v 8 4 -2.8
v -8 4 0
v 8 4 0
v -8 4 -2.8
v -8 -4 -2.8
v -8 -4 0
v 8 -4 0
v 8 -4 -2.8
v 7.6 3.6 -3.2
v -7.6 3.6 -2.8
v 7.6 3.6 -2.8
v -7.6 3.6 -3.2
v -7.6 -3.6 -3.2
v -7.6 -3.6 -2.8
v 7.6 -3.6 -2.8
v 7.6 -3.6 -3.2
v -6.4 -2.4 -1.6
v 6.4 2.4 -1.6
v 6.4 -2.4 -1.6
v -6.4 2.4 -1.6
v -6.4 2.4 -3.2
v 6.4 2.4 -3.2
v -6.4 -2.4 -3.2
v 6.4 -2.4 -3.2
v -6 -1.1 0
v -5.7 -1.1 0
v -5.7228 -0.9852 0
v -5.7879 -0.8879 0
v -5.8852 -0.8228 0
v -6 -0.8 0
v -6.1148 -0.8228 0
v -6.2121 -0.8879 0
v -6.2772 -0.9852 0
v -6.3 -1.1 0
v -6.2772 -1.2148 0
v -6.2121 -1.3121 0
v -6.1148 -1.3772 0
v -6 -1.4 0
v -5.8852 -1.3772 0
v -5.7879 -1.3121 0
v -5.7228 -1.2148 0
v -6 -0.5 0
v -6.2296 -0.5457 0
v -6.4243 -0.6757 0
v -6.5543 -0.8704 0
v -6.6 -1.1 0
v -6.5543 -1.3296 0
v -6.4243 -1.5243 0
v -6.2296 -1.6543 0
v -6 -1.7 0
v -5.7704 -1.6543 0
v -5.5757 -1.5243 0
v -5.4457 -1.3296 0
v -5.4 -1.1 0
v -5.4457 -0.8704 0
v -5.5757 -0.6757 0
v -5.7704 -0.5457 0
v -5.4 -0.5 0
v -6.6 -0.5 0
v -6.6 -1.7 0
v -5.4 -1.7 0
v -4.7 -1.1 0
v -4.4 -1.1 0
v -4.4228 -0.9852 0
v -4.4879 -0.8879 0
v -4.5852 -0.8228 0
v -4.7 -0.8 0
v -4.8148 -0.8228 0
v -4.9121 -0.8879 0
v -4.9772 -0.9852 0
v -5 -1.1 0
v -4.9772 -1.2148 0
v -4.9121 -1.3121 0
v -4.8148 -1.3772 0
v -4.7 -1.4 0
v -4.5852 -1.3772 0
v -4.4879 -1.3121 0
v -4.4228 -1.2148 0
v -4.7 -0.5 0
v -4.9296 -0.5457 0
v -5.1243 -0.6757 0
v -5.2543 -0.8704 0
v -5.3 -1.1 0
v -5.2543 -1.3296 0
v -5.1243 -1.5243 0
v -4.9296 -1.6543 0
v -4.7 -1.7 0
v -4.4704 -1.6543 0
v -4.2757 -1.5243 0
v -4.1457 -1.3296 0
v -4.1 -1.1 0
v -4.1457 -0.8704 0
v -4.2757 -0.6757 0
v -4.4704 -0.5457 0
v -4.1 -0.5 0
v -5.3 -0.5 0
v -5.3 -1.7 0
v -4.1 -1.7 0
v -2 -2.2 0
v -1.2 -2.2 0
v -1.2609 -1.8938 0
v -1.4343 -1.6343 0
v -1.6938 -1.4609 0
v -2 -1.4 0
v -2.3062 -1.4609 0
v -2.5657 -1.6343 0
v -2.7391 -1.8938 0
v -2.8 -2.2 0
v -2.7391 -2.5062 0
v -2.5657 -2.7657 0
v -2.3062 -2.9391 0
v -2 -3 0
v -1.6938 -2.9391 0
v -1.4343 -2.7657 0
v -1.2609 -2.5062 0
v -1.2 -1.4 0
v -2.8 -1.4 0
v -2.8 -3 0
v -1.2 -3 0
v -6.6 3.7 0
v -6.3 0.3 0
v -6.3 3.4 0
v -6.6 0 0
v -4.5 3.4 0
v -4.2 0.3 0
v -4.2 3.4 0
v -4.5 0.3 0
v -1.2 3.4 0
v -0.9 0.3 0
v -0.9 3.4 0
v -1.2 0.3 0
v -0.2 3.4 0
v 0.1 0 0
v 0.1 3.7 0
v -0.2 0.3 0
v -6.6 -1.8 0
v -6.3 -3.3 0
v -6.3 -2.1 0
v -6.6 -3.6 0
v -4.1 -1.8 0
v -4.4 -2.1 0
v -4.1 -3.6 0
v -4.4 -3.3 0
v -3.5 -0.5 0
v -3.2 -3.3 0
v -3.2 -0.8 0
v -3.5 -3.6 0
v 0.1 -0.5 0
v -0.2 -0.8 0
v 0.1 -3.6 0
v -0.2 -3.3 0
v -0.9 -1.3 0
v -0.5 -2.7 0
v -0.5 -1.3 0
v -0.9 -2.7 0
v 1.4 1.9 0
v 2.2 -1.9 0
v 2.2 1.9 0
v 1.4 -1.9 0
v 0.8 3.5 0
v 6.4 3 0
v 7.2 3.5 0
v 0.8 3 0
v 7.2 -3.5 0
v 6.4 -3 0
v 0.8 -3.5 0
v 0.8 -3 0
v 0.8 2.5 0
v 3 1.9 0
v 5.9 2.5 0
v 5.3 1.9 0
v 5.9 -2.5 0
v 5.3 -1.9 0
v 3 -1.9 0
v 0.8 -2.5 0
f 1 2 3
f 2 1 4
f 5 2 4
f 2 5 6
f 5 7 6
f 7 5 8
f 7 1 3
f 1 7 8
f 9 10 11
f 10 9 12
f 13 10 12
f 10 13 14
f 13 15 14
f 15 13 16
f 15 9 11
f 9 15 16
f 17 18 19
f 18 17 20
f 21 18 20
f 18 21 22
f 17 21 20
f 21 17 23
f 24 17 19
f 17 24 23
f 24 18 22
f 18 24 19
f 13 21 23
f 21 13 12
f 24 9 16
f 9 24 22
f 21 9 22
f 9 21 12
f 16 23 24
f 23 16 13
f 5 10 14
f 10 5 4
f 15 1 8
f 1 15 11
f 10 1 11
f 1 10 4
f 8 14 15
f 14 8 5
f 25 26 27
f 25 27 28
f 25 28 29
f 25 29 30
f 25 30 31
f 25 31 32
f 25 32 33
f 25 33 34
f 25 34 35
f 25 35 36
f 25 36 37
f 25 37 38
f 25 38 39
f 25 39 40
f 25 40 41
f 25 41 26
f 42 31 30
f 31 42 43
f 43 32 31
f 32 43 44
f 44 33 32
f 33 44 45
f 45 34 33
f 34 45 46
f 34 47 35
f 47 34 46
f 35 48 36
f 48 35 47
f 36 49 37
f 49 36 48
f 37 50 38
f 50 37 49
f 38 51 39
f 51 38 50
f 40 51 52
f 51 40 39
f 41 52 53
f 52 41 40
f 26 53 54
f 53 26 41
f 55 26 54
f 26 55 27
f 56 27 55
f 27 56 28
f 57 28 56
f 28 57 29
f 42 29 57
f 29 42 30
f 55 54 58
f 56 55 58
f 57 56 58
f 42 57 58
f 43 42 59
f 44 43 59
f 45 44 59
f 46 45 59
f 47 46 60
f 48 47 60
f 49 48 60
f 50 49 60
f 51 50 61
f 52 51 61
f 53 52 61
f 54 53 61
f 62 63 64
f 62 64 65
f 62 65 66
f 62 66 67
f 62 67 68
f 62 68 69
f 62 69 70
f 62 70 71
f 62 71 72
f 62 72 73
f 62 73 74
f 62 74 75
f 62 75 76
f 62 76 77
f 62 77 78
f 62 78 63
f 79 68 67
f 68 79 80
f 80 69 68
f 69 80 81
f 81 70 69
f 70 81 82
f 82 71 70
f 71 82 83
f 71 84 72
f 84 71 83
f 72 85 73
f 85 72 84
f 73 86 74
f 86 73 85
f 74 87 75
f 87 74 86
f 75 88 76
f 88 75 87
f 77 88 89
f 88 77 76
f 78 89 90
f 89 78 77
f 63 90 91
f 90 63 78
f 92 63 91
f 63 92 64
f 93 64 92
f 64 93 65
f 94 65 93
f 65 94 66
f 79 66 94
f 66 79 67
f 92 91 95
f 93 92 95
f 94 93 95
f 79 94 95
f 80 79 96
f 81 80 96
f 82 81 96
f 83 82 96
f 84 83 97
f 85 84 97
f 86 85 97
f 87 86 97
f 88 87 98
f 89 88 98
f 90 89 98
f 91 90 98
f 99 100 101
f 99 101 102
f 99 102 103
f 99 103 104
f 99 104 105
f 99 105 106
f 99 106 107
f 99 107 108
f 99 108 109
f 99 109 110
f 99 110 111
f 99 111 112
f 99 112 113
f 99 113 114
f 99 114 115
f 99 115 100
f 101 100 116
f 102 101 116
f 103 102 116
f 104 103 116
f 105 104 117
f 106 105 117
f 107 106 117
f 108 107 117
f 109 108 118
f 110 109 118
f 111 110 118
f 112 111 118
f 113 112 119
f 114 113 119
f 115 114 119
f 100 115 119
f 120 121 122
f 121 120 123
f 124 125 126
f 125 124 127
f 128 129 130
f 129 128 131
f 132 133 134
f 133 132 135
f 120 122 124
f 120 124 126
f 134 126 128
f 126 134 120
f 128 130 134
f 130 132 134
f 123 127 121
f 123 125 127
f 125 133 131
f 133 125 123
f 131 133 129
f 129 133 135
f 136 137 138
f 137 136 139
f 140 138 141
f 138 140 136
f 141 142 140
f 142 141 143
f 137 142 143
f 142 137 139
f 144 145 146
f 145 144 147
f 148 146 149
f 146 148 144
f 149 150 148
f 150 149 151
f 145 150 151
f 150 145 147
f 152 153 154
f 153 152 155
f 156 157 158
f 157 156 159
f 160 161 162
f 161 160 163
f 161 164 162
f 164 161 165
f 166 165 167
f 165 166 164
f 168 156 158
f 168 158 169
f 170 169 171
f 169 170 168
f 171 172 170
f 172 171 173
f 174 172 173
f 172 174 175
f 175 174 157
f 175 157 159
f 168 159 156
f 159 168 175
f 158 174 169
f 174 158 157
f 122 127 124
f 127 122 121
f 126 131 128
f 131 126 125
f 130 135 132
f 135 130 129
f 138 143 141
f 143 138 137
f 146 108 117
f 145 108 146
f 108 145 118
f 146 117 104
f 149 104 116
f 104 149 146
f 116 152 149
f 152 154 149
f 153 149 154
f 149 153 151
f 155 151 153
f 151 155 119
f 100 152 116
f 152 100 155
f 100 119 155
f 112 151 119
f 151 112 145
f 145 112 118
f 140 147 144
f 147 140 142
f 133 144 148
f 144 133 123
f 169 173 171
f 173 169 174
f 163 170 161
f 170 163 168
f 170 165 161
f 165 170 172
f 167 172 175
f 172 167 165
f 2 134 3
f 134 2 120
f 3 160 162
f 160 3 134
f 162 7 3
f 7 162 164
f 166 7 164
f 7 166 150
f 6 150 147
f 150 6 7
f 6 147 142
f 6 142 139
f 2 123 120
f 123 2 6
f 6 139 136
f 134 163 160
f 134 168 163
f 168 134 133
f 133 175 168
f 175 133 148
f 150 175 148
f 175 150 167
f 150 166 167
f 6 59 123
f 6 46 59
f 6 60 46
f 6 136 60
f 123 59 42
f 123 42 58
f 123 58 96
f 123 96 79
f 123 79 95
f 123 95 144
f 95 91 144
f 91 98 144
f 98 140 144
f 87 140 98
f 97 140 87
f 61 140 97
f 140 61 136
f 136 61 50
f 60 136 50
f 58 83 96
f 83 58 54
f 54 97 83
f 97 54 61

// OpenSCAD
// file: ../p/box5.scad
use <../lib.scad>
function ldraw_lib__box5() = [
// 0 Box with 5 Faces and All Edges
// 0 Name: box5.dat
// 0 Author: James Jessiman
// 0 !LDRAW_ORG Primitive UPDATE 2012-01
// 0 !LICENSE Licensed under CC BY 4.0 : see CAreadme.txt
// 
// 0 BFC CERTIFY CCW
  [0,"BFC","CERTIFY"],
  [0,"BFC","CCW"],
// 
// 0 !HISTORY 2002-04-03 [sbliss] Modified for BFC compliance
// 0 !HISTORY 2002-04-25 [PTadmin] Official Update 2002-02
// 0 !HISTORY 2007-06-24 [PTadmin] Header formatted for Contributor Agreement
// 0 !HISTORY 2008-07-01 [PTadmin] Official Update 2008-01
// 0 !HISTORY 2012-02-16 [Philo] Changed to CCW
// 0 !HISTORY 2012-03-30 [PTadmin] Official Update 2012-01
// 
// 
// 2 24 1 1 1 -1 1 1
  [2,24,1,1,1,-1,1,1],
// 2 24 -1 1 1 -1 1 -1
  [2,24,-1,1,1,-1,1,-1],
// 2 24 -1 1 -1 1 1 -1
  [2,24,-1,1,-1,1,1,-1],
// 2 24 1 1 -1 1 1 1
  [2,24,1,1,-1,1,1,1],
// 2 24 1 0 1 -1 0 1
  [2,24,1,0,1,-1,0,1],
// 2 24 -1 0 1 -1 0 -1
  [2,24,-1,0,1,-1,0,-1],
// 2 24 -1 0 -1 1 0 -1
  [2,24,-1,0,-1,1,0,-1],
// 2 24 1 0 -1 1 0 1
  [2,24,1,0,-1,1,0,1],
// 2 24 1 0 1 1 1 1
  [2,24,1,0,1,1,1,1],
// 2 24 -1 0 1 -1 1 1
  [2,24,-1,0,1,-1,1,1],
// 2 24 1 0 -1 1 1 -1
  [2,24,1,0,-1,1,1,-1],
// 2 24 -1 0 -1 -1 1 -1
  [2,24,-1,0,-1,-1,1,-1],
// 4 16 -1 1 1 1 1 1 1 1 -1 -1 1 -1
  [4,16,-1,1,1,1,1,1,1,1,-1,-1,1,-1],
// 4 16 -1 1 1 -1 0 1 1 0 1 1 1 1
  [4,16,-1,1,1,-1,0,1,1,0,1,1,1,1],
// 4 16 -1 1 -1 -1 0 -1 -1 0 1 -1 1 1
  [4,16,-1,1,-1,-1,0,-1,-1,0,1,-1,1,1],
// 4 16 1 1 -1 1 0 -1 -1 0 -1 -1 1 -1
  [4,16,1,1,-1,1,0,-1,-1,0,-1,-1,1,-1],
// 4 16 1 1 1 1 0 1 1 0 -1 1 1 -1
  [4,16,1,1,1,1,0,1,1,0,-1,1,1,-1],
];
module ldraw_lib__box5(step=0, col=false, unit=2/5, alt=false, line=0.2, solid=!$preview)
    makepoly(ldraw_lib__box5(), step=step, col=col, unit=unit, alt=alt, line=line, solid=solid);
ldraw_lib__box5(line=0.2);
// file: ../p/box4.scad
use <../lib.scad>
function ldraw_lib__box4() = [
// 0 Box with 4 Faces (2 Parallel Pairs) and All Edges
// 0 Name: box4.dat
// 0 Author: James Jessiman
// 0 !LDRAW_ORG Primitive UPDATE 2012-01
// 0 !LICENSE Licensed under CC BY 4.0 : see CAreadme.txt
// 
// 0 BFC CERTIFY CCW
  [0,"BFC","CERTIFY"],
  [0,"BFC","CCW"],
// 
// 0 !HISTORY 2002-04-03 [sbliss] Modified for BFC compliance
// 0 !HISTORY 2002-04-25 [PTadmin] Official Update 2002-02
// 0 !HISTORY 2007-06-24 [PTadmin] Header formatted for Contributor Agreement
// 0 !HISTORY 2008-07-01 [PTadmin] Official Update 2008-01
// 0 !HISTORY 2012-02-16 [Philo] Changed to CCW
// 0 !HISTORY 2012-03-30 [PTadmin] Official Update 2012-01
// 
// 
// 2 24 1 1 1 -1 1 1
  [2,24,1,1,1,-1,1,1],
// 2 24 -1 1 1 -1 1 -1
  [2,24,-1,1,1,-1,1,-1],
// 2 24 -1 1 -1 1 1 -1
  [2,24,-1,1,-1,1,1,-1],
// 2 24 1 1 -1 1 1 1
  [2,24,1,1,-1,1,1,1],
// 2 24 1 0 1 -1 0 1
  [2,24,1,0,1,-1,0,1],
// 2 24 -1 0 1 -1 0 -1
  [2,24,-1,0,1,-1,0,-1],
// 2 24 -1 0 -1 1 0 -1
  [2,24,-1,0,-1,1,0,-1],
// 2 24 1 0 -1 1 0 1
  [2,24,1,0,-1,1,0,1],
// 2 24 1 0 1 1 1 1
  [2,24,1,0,1,1,1,1],
// 2 24 -1 0 1 -1 1 1
  [2,24,-1,0,1,-1,1,1],
// 2 24 1 0 -1 1 1 -1
  [2,24,1,0,-1,1,1,-1],
// 2 24 -1 0 -1 -1 1 -1
  [2,24,-1,0,-1,-1,1,-1],
// 4 16 -1 1 1 -1 0 1 1 0 1 1 1 1
  [4,16,-1,1,1,-1,0,1,1,0,1,1,1,1],
// 4 16 -1 1 -1 -1 0 -1 -1 0 1 -1 1 1
  [4,16,-1,1,-1,-1,0,-1,-1,0,1,-1,1,1],
// 4 16 1 1 -1 1 0 -1 -1 0 -1 -1 1 -1
  [4,16,1,1,-1,1,0,-1,-1,0,-1,-1,1,-1],
// 4 16 1 1 1 1 0 1 1 0 -1 1 1 -1
  [4,16,1,1,1,1,0,1,1,0,-1,1,1,-1],
];
module ldraw_lib__box4(step=0, col=false, unit=2/5, alt=false, line=0.2, solid=!$preview)
    makepoly(ldraw_lib__box4(), step=step, col=col, unit=unit, alt=alt, line=line, solid=solid);
ldraw_lib__box4(line=0.2);
// file: s/3069bs01.scad
use <../../lib.scad>
use <../../p/box4.scad>
use <../../p/box5.scad>
function ldraw_lib__s__3069bs01() = [
// 0 ~Tile  1 x  2 with Groove without Top Face
// 0 Name: s\3069bs01.dat
// 0 Author: Santeri Piippo [arezey]
// 0 !LDRAW_ORG Subpart UPDATE 2010-02
// 0 !LICENSE Licensed under CC BY 4.0 : see CAreadme.txt
// 
// 0 BFC CERTIFY CCW
  [0,"BFC","CERTIFY"],
  [0,"BFC","CCW"],
// 
// 0 !HISTORY 2010-07-05 [PTadmin] Official Update 2010-02
// 
// 
// 1 16 0 0 0 20 0 0 0 7 0 0 0 10 box4.dat
  [1,16,0,0,0,20,0,0,0,7,0,0,0,10, ldraw_lib__box4()],
// 1 16 0 7 0 19 0 0 0 1 0 0 0 9 box4.dat
  [1,16,0,7,0,19,0,0,0,1,0,0,0,9, ldraw_lib__box4()],
// 0 BFC INVERTNEXT
  [0,"BFC","INVERTNEXT"],
// 1 16 0 8 0 16 0 0 0 -4 0 0 0 6 box5.dat
  [1,16,0,8,0,16,0,0,0,-4,0,0,0,6, ldraw_lib__box5()],
// 4 16 -19 8 9 -16 8 6 -16 8 -6 -19 8 -9
  [4,16,-19,8,9,-16,8,6,-16,8,-6,-19,8,-9],
// 4 16 19 8 -9 16 8 -6 16 8 6 19 8 9
  [4,16,19,8,-9,16,8,-6,16,8,6,19,8,9],
// 4 16 19 8 9 16 8 6 -16 8 6 -19 8 9
  [4,16,19,8,9,16,8,6,-16,8,6,-19,8,9],
// 4 16 -19 8 -9 -16 8 -6 16 8 -6 19 8 -9
  [4,16,-19,8,-9,-16,8,-6,16,8,-6,19,8,-9],
// 4 16 -20 7 10 -19 7 9 -19 7 -9 -20 7 -10
  [4,16,-20,7,10,-19,7,9,-19,7,-9,-20,7,-10],
// 4 16 20 7 -10 19 7 -9 19 7 9 20 7 10
  [4,16,20,7,-10,19,7,-9,19,7,9,20,7,10],
// 4 16 20 7 10 19 7 9 -19 7 9 -20 7 10
  [4,16,20,7,10,19,7,9,-19,7,9,-20,7,10],
// 4 16 -20 7 -10 -19 7 -9 19 7 -9 20 7 -10
  [4,16,-20,7,-10,-19,7,-9,19,7,-9,20,7,-10],
// 0 //
];
module ldraw_lib__s__3069bs01(step=0, col=false, unit=2/5, alt=false, line=0.2, solid=!$preview)
    makepoly(ldraw_lib__s__3069bs01(), step=step, col=col, unit=unit, alt=alt, line=line, solid=solid);
ldraw_lib__s__3069bs01(line=0.2);
// file: ../p/4-4ring1.scad
use <../lib.scad>
function ldraw_lib__4_4ring1() = [
// 0 Ring  1 x 1.0
// 0 Name: 4-4ring1.dat
// 0 Author: James Jessiman
// 0 !LDRAW_ORG Primitive UPDATE 2009-01
// 0 !LICENSE Licensed under CC BY 2.0 and CC BY 4.0 : see CAreadme.txt
// 
// 0 BFC CERTIFY CCW
  [0,"BFC","CERTIFY"],
  [0,"BFC","CCW"],
// 
// 0 !HISTORY 1998-12-15 [PTadmin] Official Update 1998-10
// 0 !HISTORY 2002-04-08 [BrickCaster] Modified for BFC compliance
// 0 !HISTORY 2002-04-25 [PTadmin] Official Update 2002-02
// 0 !HISTORY 2007-06-24 [PTadmin] Header formatted for Contributor Agreement
// 0 !HISTORY 2008-07-01 [PTadmin] Official Update 2008-01
// 0 !HISTORY 2008-08-26 [cwdee] Switch polygon winding and rename
// 0 !HISTORY 2009-05-02 [PTadmin] Official Update 2009-01
// 
// 
// 4 16 -0.7654 0 1.8478 -0.3827 0 0.9239 0 0 1 0 0 2
  [4,16,-0.7654,0,1.8478,-0.3827,0,0.9239,0,0,1,0,0,2],
// 4 16 -1.4142 0 1.4142 -0.7071 0 0.7071 -0.3827 0 0.9239 -0.7654 0 1.8478
  [4,16,-1.4142,0,1.4142,-0.7071,0,0.7071,-0.3827,0,0.9239,-0.7654,0,1.8478],
// 4 16 -1.8478 0 0.7654 -0.9239 0 0.3827 -0.7071 0 0.7071 -1.4142 0 1.41420
  [4,16,-1.8478,0,0.7654,-0.9239,0,0.3827,-0.7071,0,0.7071,-1.4142,0,1.41420],
// 4 16 -2 0 0 -1 0 0 -0.9239 0 0.3827 -1.8478 0 0.7654
  [4,16,-2,0,0,-1,0,0,-0.9239,0,0.3827,-1.8478,0,0.7654],
// 4 16 -1.8478 0 -0.7654 -0.9239 0 -0.3827 -1 0 0 -2 0 0
  [4,16,-1.8478,0,-0.7654,-0.9239,0,-0.3827,-1,0,0,-2,0,0],
// 4 16 -1.4142 0 -1.4142 -0.7071 0 -0.7071 -0.9239 0 -0.3827 -1.8478 0 -0.7654
  [4,16,-1.4142,0,-1.4142,-0.7071,0,-0.7071,-0.9239,0,-0.3827,-1.8478,0,-0.7654],
// 4 16 -0.7654 0 -1.8478 -0.3827 0 -0.9239 -0.7071 0 -0.7071 -1.4142 0 -1.4142
  [4,16,-0.7654,0,-1.8478,-0.3827,0,-0.9239,-0.7071,0,-0.7071,-1.4142,0,-1.4142],
// 4 16 0 0 -2 0 0 -1 -0.3827 0 -0.9239 -0.7654 0 -1.8478
  [4,16,0,0,-2,0,0,-1,-0.3827,0,-0.9239,-0.7654,0,-1.8478],
// 4 16 0.7654 0 -1.8478 0.3827 0 -0.9239 0 0 -1 0 0 -2
  [4,16,0.7654,0,-1.8478,0.3827,0,-0.9239,0,0,-1,0,0,-2],
// 4 16 1.4142 0 -1.4142 0.7071 0 -0.7071 0.3827 0 -0.9239 0.7654 0 -1.8478
  [4,16,1.4142,0,-1.4142,0.7071,0,-0.7071,0.3827,0,-0.9239,0.7654,0,-1.8478],
// 4 16 1.8478 0 -0.7654 0.9239 0 -0.3827 0.7071 0 -0.7071 1.4142 0 -1.4142
  [4,16,1.8478,0,-0.7654,0.9239,0,-0.3827,0.7071,0,-0.7071,1.4142,0,-1.4142],
// 4 16 2 0 0 1 0 0 0.9239 0 -0.3827 1.8478 0 -0.7654
  [4,16,2,0,0,1,0,0,0.9239,0,-0.3827,1.8478,0,-0.7654],
// 4 16 1.8478 0 0.7654 0.9239 0 0.3827 1 0 0 2 0 0
  [4,16,1.8478,0,0.7654,0.9239,0,0.3827,1,0,0,2,0,0],
// 4 16 1.4142 0 1.4142 0.7071 0 0.7071 0.9239 0 0.3827 1.8478 0 0.7654
  [4,16,1.4142,0,1.4142,0.7071,0,0.7071,0.9239,0,0.3827,1.8478,0,0.7654],
// 4 16 0.7654 0 1.8478 0.3827 0 0.9239 0.7071 0 0.7071 1.4142 0 1.4142
  [4,16,0.7654,0,1.8478,0.3827,0,0.9239,0.7071,0,0.7071,1.4142,0,1.4142],
// 4 16 0 0 2 0 0 1 0.3827 0 0.9239 0.7654 0 1.8478
  [4,16,0,0,2,0,0,1,0.3827,0,0.9239,0.7654,0,1.8478],
// 0
];
module ldraw_lib__4_4ring1(step=0, col=false, unit=2/5, alt=false, line=0.2, solid=!$preview)
    makepoly(ldraw_lib__4_4ring1(), step=step, col=col, unit=unit, alt=alt, line=line, solid=solid);
ldraw_lib__4_4ring1(line=0.2);
// file: ../p/4-4ndis.scad
use <../lib.scad>
function ldraw_lib__4_4ndis() = [
// 0 Disc Negative 1.0
// 0 Name: 4-4ndis.dat
// 0 Author: James Jessiman
// 0 !LDRAW_ORG Primitive UPDATE 2012-01
// 0 !LICENSE Licensed under CC BY 4.0 : see CAreadme.txt
// 
// 0 BFC CERTIFY CCW
  [0,"BFC","CERTIFY"],
  [0,"BFC","CCW"],
// 
// 0 !HISTORY 2002-03-23 [sbliss] Added BFC statement; compacted code
// 0 !HISTORY 2002-04-25 [PTadmin] Official Update 2002-02
// 0 !HISTORY 2007-06-24 [PTadmin] Header formatted for Contributor Agreement
// 0 !HISTORY 2008-07-01 [PTadmin] Official Update 2008-01
// 0 !HISTORY 2012-02-16 [Philo] Changed to CCW
// 0 !HISTORY 2012-03-30 [PTadmin] Official Update 2012-01
// 
// 
// 3 16 0.9239 0 0.3827 1 0 0 1 0 1
  [3,16,0.9239,0,0.3827,1,0,0,1,0,1],
// 3 16 0.7071 0 0.7071 0.9239 0 0.3827 1 0 1
  [3,16,0.7071,0,0.7071,0.9239,0,0.3827,1,0,1],
// 3 16 0.3827 0 0.9239 0.7071 0 0.7071 1 0 1
  [3,16,0.3827,0,0.9239,0.7071,0,0.7071,1,0,1],
// 3 16 0 0 1 0.3827 0 0.9239 1 0 1
  [3,16,0,0,1,0.3827,0,0.9239,1,0,1],
// 3 16 -0.3827 0 0.9239 0 0 1 -1 0 1
  [3,16,-0.3827,0,0.9239,0,0,1,-1,0,1],
// 3 16 -0.7071 0 0.7071 -0.3827 0 0.9239 -1 0 1
  [3,16,-0.7071,0,0.7071,-0.3827,0,0.9239,-1,0,1],
// 3 16 -0.9239 0 0.3827 -0.7071 0 0.7071 -1 0 1
  [3,16,-0.9239,0,0.3827,-0.7071,0,0.7071,-1,0,1],
// 3 16 -1 0 0 -0.9239 0 0.3827 -1 0 1
  [3,16,-1,0,0,-0.9239,0,0.3827,-1,0,1],
// 3 16 -0.9239 0 -0.3827 -1 0 0 -1 0 -1
  [3,16,-0.9239,0,-0.3827,-1,0,0,-1,0,-1],
// 3 16 -0.7071 0 -0.7071 -0.9239 0 -0.3827 -1 0 -1
  [3,16,-0.7071,0,-0.7071,-0.9239,0,-0.3827,-1,0,-1],
// 3 16 -0.3827 0 -0.9239 -0.7071 0 -0.7071 -1 0 -1
  [3,16,-0.3827,0,-0.9239,-0.7071,0,-0.7071,-1,0,-1],
// 3 16 0 0 -1 -0.3827 0 -0.9239 -1 0 -1
  [3,16,0,0,-1,-0.3827,0,-0.9239,-1,0,-1],
// 3 16 0.3827 0 -0.9239 0 0 -1 1 0 -1
  [3,16,0.3827,0,-0.9239,0,0,-1,1,0,-1],
// 3 16 0.7071 0 -0.7071 0.3827 0 -0.9239 1 0 -1
  [3,16,0.7071,0,-0.7071,0.3827,0,-0.9239,1,0,-1],
// 3 16 0.9239 0 -0.3827 0.7071 0 -0.7071 1 0 -1
  [3,16,0.9239,0,-0.3827,0.7071,0,-0.7071,1,0,-1],
// 3 16 1 0 0 0.9239 0 -0.3827 1 0 -1
  [3,16,1,0,0,0.9239,0,-0.3827,1,0,-1],
];
module ldraw_lib__4_4ndis(step=0, col=false, unit=2/5, alt=false, line=0.2, solid=!$preview)
    makepoly(ldraw_lib__4_4ndis(), step=step, col=col, unit=unit, alt=alt, line=line, solid=solid);
ldraw_lib__4_4ndis(line=0.2);
// file: ../p/4-4disc.scad
use <../lib.scad>
function ldraw_lib__4_4disc() = [
// 0 Disc 1.0
// 0 Name: 4-4disc.dat
// 0 Author: James Jessiman
// 0 !LDRAW_ORG Primitive UPDATE 2002-02
// 0 !LICENSE Licensed under CC BY 4.0 : see CAreadme.txt
// 
// 0 BFC CERTIFY CCW
  [0,"BFC","CERTIFY"],
  [0,"BFC","CCW"],
// 
// 0 !HISTORY 1998-12-15 [PTadmin] Official Update 1998-10
// 0 !HISTORY 2002-03-23 [sbliss] Added BFC statement
// 0 !HISTORY 2002-04-25 [PTadmin] Official Update 2002-02
// 0 !HISTORY 2007-06-24 [PTadmin] Header formatted for Contributor Agreement
// 0 !HISTORY 2008-07-01 [PTadmin] Official Update 2008-01
// 
// 
// 3 16 0 0 0 1 0 0 0.9239 0 0.3827
  [3,16,0,0,0,1,0,0,0.9239,0,0.3827],
// 3 16 0 0 0 0.9239 0 0.3827 0.7071 0 0.7071
  [3,16,0,0,0,0.9239,0,0.3827,0.7071,0,0.7071],
// 3 16 0 0 0 0.7071 0 0.7071 0.3827 0 0.9239
  [3,16,0,0,0,0.7071,0,0.7071,0.3827,0,0.9239],
// 3 16 0 0 0 0.3827 0 0.9239 0 0 1
  [3,16,0,0,0,0.3827,0,0.9239,0,0,1],
// 3 16 0 0 0 0 0 1 -0.3827 0 0.9239
  [3,16,0,0,0,0,0,1,-0.3827,0,0.9239],
// 3 16 0 0 0 -0.3827 0 0.9239 -0.7071 0 0.7071
  [3,16,0,0,0,-0.3827,0,0.9239,-0.7071,0,0.7071],
// 3 16 0 0 0 -0.7071 0 0.7071 -0.9239 0 0.3827
  [3,16,0,0,0,-0.7071,0,0.7071,-0.9239,0,0.3827],
// 3 16 0 0 0 -0.9239 0 0.3827 -1 0 -0
  [3,16,0,0,0,-0.9239,0,0.3827,-1,0,-0],
// 3 16 0 0 0 -1 0 -0 -0.9239 0 -0.3827
  [3,16,0,0,0,-1,0,-0,-0.9239,0,-0.3827],
// 3 16 0 0 0 -0.9239 0 -0.3827 -0.7071 0 -0.7071
  [3,16,0,0,0,-0.9239,0,-0.3827,-0.7071,0,-0.7071],
// 3 16 0 0 0 -0.7071 0 -0.7071 -0.3827 0 -0.9239
  [3,16,0,0,0,-0.7071,0,-0.7071,-0.3827,0,-0.9239],
// 3 16 0 0 0 -0.3827 0 -0.9239 0 0 -1
  [3,16,0,0,0,-0.3827,0,-0.9239,0,0,-1],
// 3 16 0 0 0 0 0 -1 0.3827 0 -0.9239
  [3,16,0,0,0,0,0,-1,0.3827,0,-0.9239],
// 3 16 0 0 0 0.3827 0 -0.9239 0.7071 0 -0.7071
  [3,16,0,0,0,0.3827,0,-0.9239,0.7071,0,-0.7071],
// 3 16 0 0 0 0.7071 0 -0.7071 0.9239 0 -0.3827
  [3,16,0,0,0,0.7071,0,-0.7071,0.9239,0,-0.3827],
// 3 16 0 0 0 0.9239 0 -0.3827 1 0 0
  [3,16,0,0,0,0.9239,0,-0.3827,1,0,0],
// 0
];
module ldraw_lib__4_4disc(step=0, col=false, unit=2/5, alt=false, line=0.2, solid=!$preview)
    makepoly(ldraw_lib__4_4disc(), step=step, col=col, unit=unit, alt=alt, line=line, solid=solid);
ldraw_lib__4_4disc(line=0.2);
// main file
use <../lib.scad>
use <../p/4-4disc.scad>
use <../p/4-4ndis.scad>
use <../p/4-4ring1.scad>
use <s/3069bs01.scad>
function ldraw_lib__3069bpzc() = [
// 0 Tile  1 x  2 with Red and Grey Video Recorder Pattern
// 0 Name: 3069bpzc.dat
// 0 Author: Vincent Messenet [Cheenzo]
// 0 !LDRAW_ORG Part UPDATE 2019-01
// 0 !LICENSE Licensed under CC BY 4.0 : see CAreadme.txt
// 
// 0 BFC CERTIFY CCW
  [0,"BFC","CERTIFY"],
  [0,"BFC","CCW"],
// 
// 0 !KEYWORDS Back To The Future, Brickheadz, BrickLink 3069bpb641, Marty McFly
// 0 !KEYWORDS Set 41611
// 
// 0 !HISTORY 2019-06-28 [PTadmin] Official Update 2019-01
// 
// 
// 1 16 0 0 0 1 0 0 0 1 0 0 0 1 s\3069bs01.dat
  [1,16,0,0,0,1,0,0,0,1,0,0,0,1, ldraw_lib__s__3069bs01()],
// 
// 0 // Circles
// 1 16 -15 0 -2.75 .75 0 0 0 1 0 0 0 .75 4-4disc.dat
  [1,16,-15,0,-2.75,.75,0,0,0,1,0,0,0,.75, ldraw_lib__4_4disc()],
// 1 71 -15 0 -2.75 .75 0 0 0 1 0 0 0 .75 4-4ring1.dat
  [1,71,-15,0,-2.75,.75,0,0,0,1,0,0,0,.75, ldraw_lib__4_4ring1()],
// 1 16 -15 0 -2.75 1.5 0 0 0 1 0 0 0 1.5 4-4ndis.dat
  [1,16,-15,0,-2.75,1.5,0,0,0,1,0,0,0,1.5, ldraw_lib__4_4ndis()],
// 
// 1 16 -11.75 0 -2.75 .75 0 0 0 1 0 0 0 .75 4-4disc.dat
  [1,16,-11.75,0,-2.75,.75,0,0,0,1,0,0,0,.75, ldraw_lib__4_4disc()],
// 1 71 -11.75 0 -2.75 .75 0 0 0 1 0 0 0 .75 4-4ring1.dat
  [1,71,-11.75,0,-2.75,.75,0,0,0,1,0,0,0,.75, ldraw_lib__4_4ring1()],
// 1 16 -11.75 0 -2.75 1.5 0 0 0 1 0 0 0 1.5 4-4ndis.dat
  [1,16,-11.75,0,-2.75,1.5,0,0,0,1,0,0,0,1.5, ldraw_lib__4_4ndis()],
// 
// 1 4 -5 0 -5.5 2 0 0 0 1 0 0 0 2 4-4disc.dat
  [1,4,-5,0,-5.5,2,0,0,0,1,0,0,0,2, ldraw_lib__4_4disc()],
// 1 16 -5 0 -5.5 2 0 0 0 1 0 0 0 2 4-4ndis.dat
  [1,16,-5,0,-5.5,2,0,0,0,1,0,0,0,2, ldraw_lib__4_4ndis()],
// 
// 0 // Grey Squares
// 4 71 -16.5 0 9.25 -16.5 0 0 -15.75 0 .75 -15.75 0 8.5
  [4,71,-16.5,0,9.25,-16.5,0,0,-15.75,0,.75,-15.75,0,8.5],
// 4 71 -11.25 0 8.5 -11.25 0 .75 -10.5 0 .75 -10.5 0 8.5
  [4,71,-11.25,0,8.5,-11.25,0,.75,-10.5,0,.75,-10.5,0,8.5],
// 4 71 -3 0 8.5 -3 0 .75 -2.25 0 .75 -2.25 0 8.5
  [4,71,-3,0,8.5,-3,0,.75,-2.25,0,.75,-2.25,0,8.5],
// 4 71 -.5 0 8.5 -.5 0 .75 .25 0 0 .25 0 9.25
  [4,71,-.5,0,8.5,-.5,0,.75,.25,0,0,.25,0,9.25],
// 3 71 -16.5 0 9.25 -15.75 0 8.5 -11.25 0 8.5
  [3,71,-16.5,0,9.25,-15.75,0,8.5,-11.25,0,8.5],
// 3 71 -16.5 0 9.25 -11.25 0 8.5 -10.5 0 8.5
  [3,71,-16.5,0,9.25,-11.25,0,8.5,-10.5,0,8.5],
// 4 71 -16.5 0 9.25 -10.5 0 8.5 -3 0 8.5 .25 0 9.25
  [4,71,-16.5,0,9.25,-10.5,0,8.5,-3,0,8.5,.25,0,9.25],
// 3 71 -3 0 8.5 -2.25 0 8.5 .25 0 9.25
  [3,71,-3,0,8.5,-2.25,0,8.5,.25,0,9.25],
// 3 71 -2.25 0 8.5 -.5 0 8.5 .25 0 9.25
  [3,71,-2.25,0,8.5,-.5,0,8.5,.25,0,9.25],
// 3 71 -16.5 0 0 -11.25 0 .75 -15.75 0 .75
  [3,71,-16.5,0,0,-11.25,0,.75,-15.75,0,.75],
// 3 71 -16.5 0 0 -10.5 0 .75 -11.25 0 .75
  [3,71,-16.5,0,0,-10.5,0,.75,-11.25,0,.75],
// 4 71 -16.5 0 0 .25 0 0 -3 0 .75 -10.5 0 .75
  [4,71,-16.5,0,0,.25,0,0,-3,0,.75,-10.5,0,.75],
// 3 71 -3 0 .75 .25 0 0 -2.25 0 .75
  [3,71,-3,0,.75,.25,0,0,-2.25,0,.75],
// 3 71 -2.25 0 .75 .25 0 0 -.5 0 .75
  [3,71,-2.25,0,.75,.25,0,0,-.5,0,.75],
// 
// 4 71 -16.5 0 -4.5 -16.5 0 -9 -15.75 0 -8.25 -15.75 0 -5.25
  [4,71,-16.5,0,-4.5,-16.5,0,-9,-15.75,0,-8.25,-15.75,0,-5.25],
// 4 71 -16.5 0 -4.5 -15.75 0 -5.25 -11 0 -5.25 -10.25 0 -4.5
  [4,71,-16.5,0,-4.5,-15.75,0,-5.25,-11,0,-5.25,-10.25,0,-4.5],
// 4 71 -11 0 -5.25 -11 0 -8.25 -10.25 0 -9 -10.25 0 -4.5
  [4,71,-11,0,-5.25,-11,0,-8.25,-10.25,0,-9,-10.25,0,-4.5],
// 4 71 -16.5 0 -9 -10.25 0 -9 -11 0 -8.25 -15.75 0 -8.25
  [4,71,-16.5,0,-9,-10.25,0,-9,-11,0,-8.25,-15.75,0,-8.25],
// 
// 4 71 -8.75 0 -1.25 -8.75 0 -9 -8 0 -8.25 -8 0 -2
  [4,71,-8.75,0,-1.25,-8.75,0,-9,-8,0,-8.25,-8,0,-2],
// 4 71 -8.75 0 -1.25 -8 0 -2 -.5 0 -2 .25 0 -1.25
  [4,71,-8.75,0,-1.25,-8,0,-2,-.5,0,-2,.25,0,-1.25],
// 4 71 -.5 0 -2 -.5 0 -8.25 .25 0 -9 .25 0 -1.25
  [4,71,-.5,0,-2,-.5,0,-8.25,.25,0,-9,.25,0,-1.25],
// 4 71 -8.75 0 -9 .25 0 -9 -.5 0 -8.25 -8 0 -8.25
  [4,71,-8.75,0,-9,.25,0,-9,-.5,0,-8.25,-8,0,-8.25],
// 
// 4 71 -2.25 0 -3.25 -2.25 0 -6.75 -1.25 0 -6.75 -1.25 0 -3.25
  [4,71,-2.25,0,-3.25,-2.25,0,-6.75,-1.25,0,-6.75,-1.25,0,-3.25],
// 
// 0 // White Square
// 4 15 3.5 0 4.75 3.5 0 -4.75 5.5 0 -4.75 5.5 0 4.75
  [4,15,3.5,0,4.75,3.5,0,-4.75,5.5,0,-4.75,5.5,0,4.75],
// 
// 0 // Red Squares
// 4 4 2 0 8.75 2 0 7.5 16 0 7.5 18 0 8.75
  [4,4,2,0,8.75,2,0,7.5,16,0,7.5,18,0,8.75],
// 4 4 16 0 7.5 16 0 -7.5 18 0 -8.75 18 0 8.75
  [4,4,16,0,7.5,16,0,-7.5,18,0,-8.75,18,0,8.75],
// 4 4 2 0 -7.5 2 0 -8.75 18 0 -8.75 16 0 -7.5
  [4,4,2,0,-7.5,2,0,-8.75,18,0,-8.75,16,0,-7.5],
// 3 4 2 0 6.25 3.5 0 4.75 5.5 0 4.75
  [3,4,2,0,6.25,3.5,0,4.75,5.5,0,4.75],
// 3 4 2 0 6.25 5.5 0 4.75 7.5 0 4.75
  [3,4,2,0,6.25,5.5,0,4.75,7.5,0,4.75],
// 4 4 2 0 6.25 7.5 0 4.75 13.25 0 4.75 14.75 0 6.25
  [4,4,2,0,6.25,7.5,0,4.75,13.25,0,4.75,14.75,0,6.25],
// 4 4 13.25 0 4.75 13.25 0 -4.75 14.75 0 -6.25 14.75 0 6.25
  [4,4,13.25,0,4.75,13.25,0,-4.75,14.75,0,-6.25,14.75,0,6.25],
// 4 4 2 0 -6.25 14.75 0 -6.25 13.25 0 -4.75 7.5 0 -4.75
  [4,4,2,0,-6.25,14.75,0,-6.25,13.25,0,-4.75,7.5,0,-4.75],
// 3 4 2 0 -6.25 7.5 0 -4.75 5.5 0 -4.75
  [3,4,2,0,-6.25,7.5,0,-4.75,5.5,0,-4.75],
// 3 4 2 0 -6.25 5.5 0 -4.75 3.5 0 -4.75
  [3,4,2,0,-6.25,5.5,0,-4.75,3.5,0,-4.75],
// 4 4 2 0 6.25 2 0 -6.25 3.5 0 -4.75 3.5 0 4.75
  [4,4,2,0,6.25,2,0,-6.25,3.5,0,-4.75,3.5,0,4.75],
// 4 4 5.5 0 4.75 5.5 0 -4.75 7.5 0 -4.75 7.5 0 4.75
  [4,4,5.5,0,4.75,5.5,0,-4.75,7.5,0,-4.75,7.5,0,4.75],
// 0 // Main Color Squares
// 4 16 -15.75 0 8.5 -15.75 0 .75 -11.25 0 .75 -11.25 0 8.5
  [4,16,-15.75,0,8.5,-15.75,0,.75,-11.25,0,.75,-11.25,0,8.5],
// 4 16 -10.5 0 8.5 -10.5 0 .75 -3 0 .75 -3 0 8.5
  [4,16,-10.5,0,8.5,-10.5,0,.75,-3,0,.75,-3,0,8.5],
// 4 16 -2.25 0 8.5 -2.25 0 .75 -.5 0 .75 -.5 0 8.5
  [4,16,-2.25,0,8.5,-2.25,0,.75,-.5,0,.75,-.5,0,8.5],
// 4 16 -15.75 0 -5.25 -15.75 0 -8.25 -11 0 -8.25 -11 0 -5.25
  [4,16,-15.75,0,-5.25,-15.75,0,-8.25,-11,0,-8.25,-11,0,-5.25],
// 3 16 -8 0 -2 -7 0 -5.5 -7 0 -3.5
  [3,16,-8,0,-2,-7,0,-5.5,-7,0,-3.5],
// 4 16 -8 0 -2 -8 0 -8.25 -7 0 -7.5 -7 0 -5.5
  [4,16,-8,0,-2,-8,0,-8.25,-7,0,-7.5,-7,0,-5.5],
// 3 16 -8 0 -2 -7 0 -3.5 -5 0 -3.5
  [3,16,-8,0,-2,-7,0,-3.5,-5,0,-3.5],
// 4 16 -8 0 -2 -5 0 -3.5 -3 0 -3.5 -.5 0 -2
  [4,16,-8,0,-2,-5,0,-3.5,-3,0,-3.5,-.5,0,-2],
// 3 16 -3 0 -3.5 -2.25 0 -3.25 -.5 0 -2
  [3,16,-3,0,-3.5,-2.25,0,-3.25,-.5,0,-2],
// 3 16 -2.25 0 -3.25 -1.25 0 -3.25 -.5 0 -2
  [3,16,-2.25,0,-3.25,-1.25,0,-3.25,-.5,0,-2],
// 4 16 -1.25 0 -3.25 -1.25 0 -6.75 -.5 0 -8.25 -.5 0 -2
  [4,16,-1.25,0,-3.25,-1.25,0,-6.75,-.5,0,-8.25,-.5,0,-2],
// 4 16 -3 0 -7.5 -.5 0 -8.25 -1.25 0 -6.75 -2.25 0 -6.75
  [4,16,-3,0,-7.5,-.5,0,-8.25,-1.25,0,-6.75,-2.25,0,-6.75],
// 4 16 -3 0 -3.5 -3 0 -5.5 -2.25 0 -6.75 -2.25 0 -3.25
  [4,16,-3,0,-3.5,-3,0,-5.5,-2.25,0,-6.75,-2.25,0,-3.25],
// 3 16 -3 0 -5.5 -3 0 -7.5 -2.25 0 -6.75
  [3,16,-3,0,-5.5,-3,0,-7.5,-2.25,0,-6.75],
// 4 16 -8 0 -8.25 -.5 0 -8.25 -3 0 -7.5 -5 0 -7.5
  [4,16,-8,0,-8.25,-.5,0,-8.25,-3,0,-7.5,-5,0,-7.5],
// 3 16 -8 0 -8.25 -5 0 -7.5 -7 0 -7.5
  [3,16,-8,0,-8.25,-5,0,-7.5,-7,0,-7.5],
// 4 16 -10.25 0 -4.5 -10.25 0 -9 -8.75 0 -9 -8.75 0 -1.25
  [4,16,-10.25,0,-4.5,-10.25,0,-9,-8.75,0,-9,-8.75,0,-1.25],
// 4 16 -16.5 0 0 -8.75 0 -1.25 .25 0 -1.25 .25 0 0
  [4,16,-16.5,0,0,-8.75,0,-1.25,.25,0,-1.25,.25,0,0],
// 
// 4 16 7.5 0 4.75 7.5 0 -4.75 13.25 0 -4.75 13.25 0 4.75
  [4,16,7.5,0,4.75,7.5,0,-4.75,13.25,0,-4.75,13.25,0,4.75],
// 4 16 2 0 7.5 2 0 6.25 14.75 0 6.25 16 0 7.5
  [4,16,2,0,7.5,2,0,6.25,14.75,0,6.25,16,0,7.5],
// 4 16 14.75 0 6.25 14.75 0 -6.25 16 0 -7.5 16 0 7.5
  [4,16,14.75,0,6.25,14.75,0,-6.25,16,0,-7.5,16,0,7.5],
// 4 16 2 0 -6.25 2 0 -7.5 16 0 -7.5 14.75 0 -6.25
  [4,16,2,0,-6.25,2,0,-7.5,16,0,-7.5,14.75,0,-6.25],
// 
// 4 16 -20 0 10 -16.5 0 9.25 .25 0 9.25 20 0 10
  [4,16,-20,0,10,-16.5,0,9.25,.25,0,9.25,20,0,10],
// 4 16 .25 0 9.25 2 0 8.75 18 0 8.75 20 0 10
  [4,16,.25,0,9.25,2,0,8.75,18,0,8.75,20,0,10],
// 4 16 18 0 8.75 18 0 -8.75 20 0 -10 20 0 10
  [4,16,18,0,8.75,18,0,-8.75,20,0,-10,20,0,10],
// 4 16 .25 0 -9 20 0 -10 18 0 -8.75 2 0 -8.75
  [4,16,.25,0,-9,20,0,-10,18,0,-8.75,2,0,-8.75],
// 4 16 -20 0 -10 20 0 -10 .25 0 -9 -8.75 0 -9
  [4,16,-20,0,-10,20,0,-10,.25,0,-9,-8.75,0,-9],
// 3 16 -20 0 -10 -8.75 0 -9 -10.25 0 -9
  [3,16,-20,0,-10,-8.75,0,-9,-10.25,0,-9],
// 3 16 -20 0 -10 -10.25 0 -9 -16.5 0 -9
  [3,16,-20,0,-10,-10.25,0,-9,-16.5,0,-9],
// 4 16 -20 0 10 -20 0 -10 -16.5 0 0 -16.5 0 9.25
  [4,16,-20,0,10,-20,0,-10,-16.5,0,0,-16.5,0,9.25],
// 3 16 -20 0 -10 -16.5 0 -9 -16.5 0 -4.5
  [3,16,-20,0,-10,-16.5,0,-9,-16.5,0,-4.5],
// 3 16 .25 0 9.25 2 0 7.5 2 0 8.75
  [3,16,.25,0,9.25,2,0,7.5,2,0,8.75],
// 4 16 2 0 7.5 .25 0 9.25 .25 0 0 2 0 6.25
  [4,16,2,0,7.5,.25,0,9.25,.25,0,0,2,0,6.25],
// 4 16 .25 0 0 .25 0 -1.25 2 0 -6.25 2 0 6.25
  [4,16,.25,0,0,.25,0,-1.25,2,0,-6.25,2,0,6.25],
// 4 16 2 0 -7.5 2 0 -6.25 .25 0 -1.25 .25 0 -9
  [4,16,2,0,-7.5,2,0,-6.25,.25,0,-1.25,.25,0,-9],
// 3 16 .25 0 -9 2 0 -8.75 2 0 -7.5
  [3,16,.25,0,-9,2,0,-8.75,2,0,-7.5],
// 
// 3 16 -20 0 -10 -16.5 0 -1.25 -16.5 0 0
  [3,16,-20,0,-10,-16.5,0,-1.25,-16.5,0,0],
// 3 16 -20 0 -10 -16.5 0 -2.75 -16.5 0 -1.25
  [3,16,-20,0,-10,-16.5,0,-2.75,-16.5,0,-1.25],
// 3 16 -20 0 -10 -16.5 0 -4.25 -16.5 0 -2.75
  [3,16,-20,0,-10,-16.5,0,-4.25,-16.5,0,-2.75],
// 3 16 -20 0 -10 -16.5 0 -4.5 -16.5 0 -4.25
  [3,16,-20,0,-10,-16.5,0,-4.5,-16.5,0,-4.25],
// 3 16 -16.5 0 0 -16.5 0 -1.25 -15 0 -1.25
  [3,16,-16.5,0,0,-16.5,0,-1.25,-15,0,-1.25],
// 3 16 -16.5 0 0 -15 0 -1.25 -13.5 0 -1.25
  [3,16,-16.5,0,0,-15,0,-1.25,-13.5,0,-1.25],
// 3 16 -16.5 0 0 -13.5 0 -1.25 -13.25 0 -1.25
  [3,16,-16.5,0,0,-13.5,0,-1.25,-13.25,0,-1.25],
// 3 16 -16.5 0 0 -13.25 0 -1.25 -11.75 0 -1.25
  [3,16,-16.5,0,0,-13.25,0,-1.25,-11.75,0,-1.25],
// 3 16 -16.5 0 0 -11.75 0 -1.25 -10.25 0 -1.25
  [3,16,-16.5,0,0,-11.75,0,-1.25,-10.25,0,-1.25],
// 3 16 -16.5 0 0 -10.25 0 -1.25 -8.75 0 -1.25
  [3,16,-16.5,0,0,-10.25,0,-1.25,-8.75,0,-1.25],
// 3 16 -10.25 0 -1.25 -10.25 0 -2.75 -8.75 0 -1.25
  [3,16,-10.25,0,-1.25,-10.25,0,-2.75,-8.75,0,-1.25],
// 3 16 -10.25 0 -2.75 -10.25 0 -4.25 -8.75 0 -1.25
  [3,16,-10.25,0,-2.75,-10.25,0,-4.25,-8.75,0,-1.25],
// 3 16 -10.25 0 -4.25 -10.25 0 -4.5 -8.75 0 -1.25
  [3,16,-10.25,0,-4.25,-10.25,0,-4.5,-8.75,0,-1.25],
// 3 16 -11.75 0 -4.25 -10.25 0 -4.5 -10.25 0 -4.25
  [3,16,-11.75,0,-4.25,-10.25,0,-4.5,-10.25,0,-4.25],
// 3 16 -13.25 0 -4.25 -10.25 0 -4.5 -11.75 0 -4.25
  [3,16,-13.25,0,-4.25,-10.25,0,-4.5,-11.75,0,-4.25],
// 4 16 -13.25 0 -4.25 -13.5 0 -4.25 -16.5 0 -4.5 -10.25 0 -4.5
  [4,16,-13.25,0,-4.25,-13.5,0,-4.25,-16.5,0,-4.5,-10.25,0,-4.5],
// 3 16 -16.5 0 -4.5 -13.5 0 -4.25 -15 0 -4.25
  [3,16,-16.5,0,-4.5,-13.5,0,-4.25,-15,0,-4.25],
// 3 16 -16.5 0 -4.25 -16.5 0 -4.5 -15 0 -4.25
  [3,16,-16.5,0,-4.25,-16.5,0,-4.5,-15,0,-4.25],
// 4 16 -13.5 0 -1.25 -13.5 0 -2.75 -13.25 0 -2.75 -13.25 0 -1.25
  [4,16,-13.5,0,-1.25,-13.5,0,-2.75,-13.25,0,-2.75,-13.25,0,-1.25],
// 4 16 -13.5 0 -2.75 -13.5 0 -4.25 -13.25 0 -4.25 -13.25 0 -2.75
  [4,16,-13.5,0,-2.75,-13.5,0,-4.25,-13.25,0,-4.25,-13.25,0,-2.75],
];
module ldraw_lib__3069bpzc(step=0, col=false, unit=2/5, alt=false, line=0.2, solid=!$preview)
    makepoly(ldraw_lib__3069bpzc(), step=step, col=col, unit=unit, alt=alt, line=line, solid=solid);
ldraw_lib__3069bpzc(line=0.2);
